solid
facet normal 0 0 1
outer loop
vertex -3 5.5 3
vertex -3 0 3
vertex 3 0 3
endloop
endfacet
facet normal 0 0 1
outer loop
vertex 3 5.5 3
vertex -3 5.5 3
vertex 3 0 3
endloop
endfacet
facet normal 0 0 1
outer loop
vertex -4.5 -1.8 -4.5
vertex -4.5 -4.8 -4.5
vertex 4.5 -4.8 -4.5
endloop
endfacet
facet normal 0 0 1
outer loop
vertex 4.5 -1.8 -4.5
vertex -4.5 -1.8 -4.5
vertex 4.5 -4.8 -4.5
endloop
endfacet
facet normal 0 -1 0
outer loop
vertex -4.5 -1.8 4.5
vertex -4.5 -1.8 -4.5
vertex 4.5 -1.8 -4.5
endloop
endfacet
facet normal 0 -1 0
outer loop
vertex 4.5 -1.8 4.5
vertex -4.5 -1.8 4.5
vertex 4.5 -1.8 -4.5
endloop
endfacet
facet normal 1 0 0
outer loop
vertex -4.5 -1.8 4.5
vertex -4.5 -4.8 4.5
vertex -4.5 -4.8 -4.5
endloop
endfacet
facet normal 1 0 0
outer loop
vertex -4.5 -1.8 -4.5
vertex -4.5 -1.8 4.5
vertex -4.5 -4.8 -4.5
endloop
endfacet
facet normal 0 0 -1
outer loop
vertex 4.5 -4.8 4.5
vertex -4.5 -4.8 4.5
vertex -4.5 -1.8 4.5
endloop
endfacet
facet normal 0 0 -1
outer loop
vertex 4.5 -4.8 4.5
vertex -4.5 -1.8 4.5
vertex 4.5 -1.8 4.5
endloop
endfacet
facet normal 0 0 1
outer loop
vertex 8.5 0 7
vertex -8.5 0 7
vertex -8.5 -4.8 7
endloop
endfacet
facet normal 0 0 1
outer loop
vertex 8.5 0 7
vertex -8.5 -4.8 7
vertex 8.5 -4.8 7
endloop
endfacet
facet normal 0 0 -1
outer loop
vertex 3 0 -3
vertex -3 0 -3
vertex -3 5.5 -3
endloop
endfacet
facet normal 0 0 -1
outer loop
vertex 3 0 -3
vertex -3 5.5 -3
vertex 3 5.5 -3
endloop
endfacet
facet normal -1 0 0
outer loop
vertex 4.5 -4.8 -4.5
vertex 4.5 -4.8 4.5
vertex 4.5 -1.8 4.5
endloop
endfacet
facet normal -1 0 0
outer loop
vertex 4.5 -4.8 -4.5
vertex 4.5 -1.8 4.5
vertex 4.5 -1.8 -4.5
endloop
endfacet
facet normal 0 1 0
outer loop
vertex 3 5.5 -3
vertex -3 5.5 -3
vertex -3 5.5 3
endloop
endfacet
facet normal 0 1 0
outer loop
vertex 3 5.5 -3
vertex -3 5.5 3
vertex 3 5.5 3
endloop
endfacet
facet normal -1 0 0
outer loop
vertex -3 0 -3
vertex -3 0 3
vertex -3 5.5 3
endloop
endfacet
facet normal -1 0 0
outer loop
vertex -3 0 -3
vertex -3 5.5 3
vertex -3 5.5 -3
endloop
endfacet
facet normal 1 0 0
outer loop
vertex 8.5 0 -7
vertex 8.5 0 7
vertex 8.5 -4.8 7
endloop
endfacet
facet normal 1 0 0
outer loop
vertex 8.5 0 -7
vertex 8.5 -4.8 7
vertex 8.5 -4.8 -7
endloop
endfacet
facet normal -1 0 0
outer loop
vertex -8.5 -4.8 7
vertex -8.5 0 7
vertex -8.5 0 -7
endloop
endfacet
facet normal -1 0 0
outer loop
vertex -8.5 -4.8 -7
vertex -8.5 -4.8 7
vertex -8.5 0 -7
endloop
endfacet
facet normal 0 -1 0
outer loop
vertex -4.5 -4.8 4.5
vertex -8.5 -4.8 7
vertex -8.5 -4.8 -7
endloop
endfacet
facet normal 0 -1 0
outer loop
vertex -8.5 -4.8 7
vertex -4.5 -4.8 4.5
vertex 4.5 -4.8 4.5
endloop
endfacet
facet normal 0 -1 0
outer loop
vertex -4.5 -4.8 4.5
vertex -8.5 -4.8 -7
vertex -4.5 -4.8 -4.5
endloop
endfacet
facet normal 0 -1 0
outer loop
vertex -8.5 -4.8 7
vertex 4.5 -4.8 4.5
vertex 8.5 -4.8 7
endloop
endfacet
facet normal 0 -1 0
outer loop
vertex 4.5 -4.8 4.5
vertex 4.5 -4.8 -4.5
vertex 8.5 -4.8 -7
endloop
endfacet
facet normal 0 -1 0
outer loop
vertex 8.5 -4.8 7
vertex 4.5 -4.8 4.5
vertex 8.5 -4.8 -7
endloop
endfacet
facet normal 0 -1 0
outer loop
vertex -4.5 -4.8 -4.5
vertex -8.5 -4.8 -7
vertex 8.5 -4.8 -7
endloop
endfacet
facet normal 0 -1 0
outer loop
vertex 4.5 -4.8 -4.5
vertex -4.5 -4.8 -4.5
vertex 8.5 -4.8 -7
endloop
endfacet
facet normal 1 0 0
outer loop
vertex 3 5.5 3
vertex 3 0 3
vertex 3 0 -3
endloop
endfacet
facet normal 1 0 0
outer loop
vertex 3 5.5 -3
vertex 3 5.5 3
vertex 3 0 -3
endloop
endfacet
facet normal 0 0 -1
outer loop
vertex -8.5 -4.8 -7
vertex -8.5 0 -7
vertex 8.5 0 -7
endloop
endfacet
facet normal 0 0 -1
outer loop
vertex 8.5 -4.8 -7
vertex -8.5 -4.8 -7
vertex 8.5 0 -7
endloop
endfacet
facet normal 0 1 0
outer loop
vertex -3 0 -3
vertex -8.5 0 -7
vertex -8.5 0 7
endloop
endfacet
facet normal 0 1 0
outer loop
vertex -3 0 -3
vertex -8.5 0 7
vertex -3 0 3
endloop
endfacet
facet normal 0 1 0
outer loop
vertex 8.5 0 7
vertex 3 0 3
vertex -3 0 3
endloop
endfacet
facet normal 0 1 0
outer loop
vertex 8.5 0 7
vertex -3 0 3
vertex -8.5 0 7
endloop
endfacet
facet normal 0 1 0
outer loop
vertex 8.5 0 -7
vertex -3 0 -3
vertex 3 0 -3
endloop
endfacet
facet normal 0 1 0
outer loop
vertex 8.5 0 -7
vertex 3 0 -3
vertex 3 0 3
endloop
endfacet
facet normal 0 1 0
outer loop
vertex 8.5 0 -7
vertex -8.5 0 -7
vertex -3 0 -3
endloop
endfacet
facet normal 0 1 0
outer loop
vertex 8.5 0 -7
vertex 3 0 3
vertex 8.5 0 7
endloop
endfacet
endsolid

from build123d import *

# Parameters (mm, degrees)
SKETCH1_W           = 17
SKETCH1_H           = 14
BOSS_EXTRUDE1_DEPTH = 4.8
CUT_EXTRUDE1_START  = -4.8
SKETCH1_6_W         = 9
SKETCH1_6_H         = 9
CUT_EXTRUDE1_DEPTH  = 3
SKETCH1_3_W         = 6
SKETCH1_3_H         = 6
BOSS_EXTRUDE2_DEPTH = 5.5


with BuildPart() as part:
    # Sketch1 → Boss-Extrude1 (new body)
    with BuildSketch(Plane(origin=(0, 0, 0), x_dir=(1, 0, 0), z_dir=(0, 1, 0))):
        Rectangle(SKETCH1_W, SKETCH1_H)
    extrude(amount=-BOSS_EXTRUDE1_DEPTH)

    # Sketch1<6> → Cut-Extrude1 (cut)
    with BuildSketch(Plane(origin=(0, 0, 0), x_dir=(1, 0, 0), z_dir=(0, 1, 0)).offset(CUT_EXTRUDE1_START)):
        Rectangle(SKETCH1_6_W, SKETCH1_6_H)
    extrude(amount=CUT_EXTRUDE1_DEPTH, mode=Mode.SUBTRACT)

    # Sketch1<3> → Boss-Extrude2 (add)
    with BuildSketch(Plane(origin=(0, 0, 0), x_dir=(1, 0, 0), z_dir=(0, 1, 0))):
        Rectangle(SKETCH1_3_W, SKETCH1_3_H)
    extrude(amount=BOSS_EXTRUDE2_DEPTH)


solid = part.part
